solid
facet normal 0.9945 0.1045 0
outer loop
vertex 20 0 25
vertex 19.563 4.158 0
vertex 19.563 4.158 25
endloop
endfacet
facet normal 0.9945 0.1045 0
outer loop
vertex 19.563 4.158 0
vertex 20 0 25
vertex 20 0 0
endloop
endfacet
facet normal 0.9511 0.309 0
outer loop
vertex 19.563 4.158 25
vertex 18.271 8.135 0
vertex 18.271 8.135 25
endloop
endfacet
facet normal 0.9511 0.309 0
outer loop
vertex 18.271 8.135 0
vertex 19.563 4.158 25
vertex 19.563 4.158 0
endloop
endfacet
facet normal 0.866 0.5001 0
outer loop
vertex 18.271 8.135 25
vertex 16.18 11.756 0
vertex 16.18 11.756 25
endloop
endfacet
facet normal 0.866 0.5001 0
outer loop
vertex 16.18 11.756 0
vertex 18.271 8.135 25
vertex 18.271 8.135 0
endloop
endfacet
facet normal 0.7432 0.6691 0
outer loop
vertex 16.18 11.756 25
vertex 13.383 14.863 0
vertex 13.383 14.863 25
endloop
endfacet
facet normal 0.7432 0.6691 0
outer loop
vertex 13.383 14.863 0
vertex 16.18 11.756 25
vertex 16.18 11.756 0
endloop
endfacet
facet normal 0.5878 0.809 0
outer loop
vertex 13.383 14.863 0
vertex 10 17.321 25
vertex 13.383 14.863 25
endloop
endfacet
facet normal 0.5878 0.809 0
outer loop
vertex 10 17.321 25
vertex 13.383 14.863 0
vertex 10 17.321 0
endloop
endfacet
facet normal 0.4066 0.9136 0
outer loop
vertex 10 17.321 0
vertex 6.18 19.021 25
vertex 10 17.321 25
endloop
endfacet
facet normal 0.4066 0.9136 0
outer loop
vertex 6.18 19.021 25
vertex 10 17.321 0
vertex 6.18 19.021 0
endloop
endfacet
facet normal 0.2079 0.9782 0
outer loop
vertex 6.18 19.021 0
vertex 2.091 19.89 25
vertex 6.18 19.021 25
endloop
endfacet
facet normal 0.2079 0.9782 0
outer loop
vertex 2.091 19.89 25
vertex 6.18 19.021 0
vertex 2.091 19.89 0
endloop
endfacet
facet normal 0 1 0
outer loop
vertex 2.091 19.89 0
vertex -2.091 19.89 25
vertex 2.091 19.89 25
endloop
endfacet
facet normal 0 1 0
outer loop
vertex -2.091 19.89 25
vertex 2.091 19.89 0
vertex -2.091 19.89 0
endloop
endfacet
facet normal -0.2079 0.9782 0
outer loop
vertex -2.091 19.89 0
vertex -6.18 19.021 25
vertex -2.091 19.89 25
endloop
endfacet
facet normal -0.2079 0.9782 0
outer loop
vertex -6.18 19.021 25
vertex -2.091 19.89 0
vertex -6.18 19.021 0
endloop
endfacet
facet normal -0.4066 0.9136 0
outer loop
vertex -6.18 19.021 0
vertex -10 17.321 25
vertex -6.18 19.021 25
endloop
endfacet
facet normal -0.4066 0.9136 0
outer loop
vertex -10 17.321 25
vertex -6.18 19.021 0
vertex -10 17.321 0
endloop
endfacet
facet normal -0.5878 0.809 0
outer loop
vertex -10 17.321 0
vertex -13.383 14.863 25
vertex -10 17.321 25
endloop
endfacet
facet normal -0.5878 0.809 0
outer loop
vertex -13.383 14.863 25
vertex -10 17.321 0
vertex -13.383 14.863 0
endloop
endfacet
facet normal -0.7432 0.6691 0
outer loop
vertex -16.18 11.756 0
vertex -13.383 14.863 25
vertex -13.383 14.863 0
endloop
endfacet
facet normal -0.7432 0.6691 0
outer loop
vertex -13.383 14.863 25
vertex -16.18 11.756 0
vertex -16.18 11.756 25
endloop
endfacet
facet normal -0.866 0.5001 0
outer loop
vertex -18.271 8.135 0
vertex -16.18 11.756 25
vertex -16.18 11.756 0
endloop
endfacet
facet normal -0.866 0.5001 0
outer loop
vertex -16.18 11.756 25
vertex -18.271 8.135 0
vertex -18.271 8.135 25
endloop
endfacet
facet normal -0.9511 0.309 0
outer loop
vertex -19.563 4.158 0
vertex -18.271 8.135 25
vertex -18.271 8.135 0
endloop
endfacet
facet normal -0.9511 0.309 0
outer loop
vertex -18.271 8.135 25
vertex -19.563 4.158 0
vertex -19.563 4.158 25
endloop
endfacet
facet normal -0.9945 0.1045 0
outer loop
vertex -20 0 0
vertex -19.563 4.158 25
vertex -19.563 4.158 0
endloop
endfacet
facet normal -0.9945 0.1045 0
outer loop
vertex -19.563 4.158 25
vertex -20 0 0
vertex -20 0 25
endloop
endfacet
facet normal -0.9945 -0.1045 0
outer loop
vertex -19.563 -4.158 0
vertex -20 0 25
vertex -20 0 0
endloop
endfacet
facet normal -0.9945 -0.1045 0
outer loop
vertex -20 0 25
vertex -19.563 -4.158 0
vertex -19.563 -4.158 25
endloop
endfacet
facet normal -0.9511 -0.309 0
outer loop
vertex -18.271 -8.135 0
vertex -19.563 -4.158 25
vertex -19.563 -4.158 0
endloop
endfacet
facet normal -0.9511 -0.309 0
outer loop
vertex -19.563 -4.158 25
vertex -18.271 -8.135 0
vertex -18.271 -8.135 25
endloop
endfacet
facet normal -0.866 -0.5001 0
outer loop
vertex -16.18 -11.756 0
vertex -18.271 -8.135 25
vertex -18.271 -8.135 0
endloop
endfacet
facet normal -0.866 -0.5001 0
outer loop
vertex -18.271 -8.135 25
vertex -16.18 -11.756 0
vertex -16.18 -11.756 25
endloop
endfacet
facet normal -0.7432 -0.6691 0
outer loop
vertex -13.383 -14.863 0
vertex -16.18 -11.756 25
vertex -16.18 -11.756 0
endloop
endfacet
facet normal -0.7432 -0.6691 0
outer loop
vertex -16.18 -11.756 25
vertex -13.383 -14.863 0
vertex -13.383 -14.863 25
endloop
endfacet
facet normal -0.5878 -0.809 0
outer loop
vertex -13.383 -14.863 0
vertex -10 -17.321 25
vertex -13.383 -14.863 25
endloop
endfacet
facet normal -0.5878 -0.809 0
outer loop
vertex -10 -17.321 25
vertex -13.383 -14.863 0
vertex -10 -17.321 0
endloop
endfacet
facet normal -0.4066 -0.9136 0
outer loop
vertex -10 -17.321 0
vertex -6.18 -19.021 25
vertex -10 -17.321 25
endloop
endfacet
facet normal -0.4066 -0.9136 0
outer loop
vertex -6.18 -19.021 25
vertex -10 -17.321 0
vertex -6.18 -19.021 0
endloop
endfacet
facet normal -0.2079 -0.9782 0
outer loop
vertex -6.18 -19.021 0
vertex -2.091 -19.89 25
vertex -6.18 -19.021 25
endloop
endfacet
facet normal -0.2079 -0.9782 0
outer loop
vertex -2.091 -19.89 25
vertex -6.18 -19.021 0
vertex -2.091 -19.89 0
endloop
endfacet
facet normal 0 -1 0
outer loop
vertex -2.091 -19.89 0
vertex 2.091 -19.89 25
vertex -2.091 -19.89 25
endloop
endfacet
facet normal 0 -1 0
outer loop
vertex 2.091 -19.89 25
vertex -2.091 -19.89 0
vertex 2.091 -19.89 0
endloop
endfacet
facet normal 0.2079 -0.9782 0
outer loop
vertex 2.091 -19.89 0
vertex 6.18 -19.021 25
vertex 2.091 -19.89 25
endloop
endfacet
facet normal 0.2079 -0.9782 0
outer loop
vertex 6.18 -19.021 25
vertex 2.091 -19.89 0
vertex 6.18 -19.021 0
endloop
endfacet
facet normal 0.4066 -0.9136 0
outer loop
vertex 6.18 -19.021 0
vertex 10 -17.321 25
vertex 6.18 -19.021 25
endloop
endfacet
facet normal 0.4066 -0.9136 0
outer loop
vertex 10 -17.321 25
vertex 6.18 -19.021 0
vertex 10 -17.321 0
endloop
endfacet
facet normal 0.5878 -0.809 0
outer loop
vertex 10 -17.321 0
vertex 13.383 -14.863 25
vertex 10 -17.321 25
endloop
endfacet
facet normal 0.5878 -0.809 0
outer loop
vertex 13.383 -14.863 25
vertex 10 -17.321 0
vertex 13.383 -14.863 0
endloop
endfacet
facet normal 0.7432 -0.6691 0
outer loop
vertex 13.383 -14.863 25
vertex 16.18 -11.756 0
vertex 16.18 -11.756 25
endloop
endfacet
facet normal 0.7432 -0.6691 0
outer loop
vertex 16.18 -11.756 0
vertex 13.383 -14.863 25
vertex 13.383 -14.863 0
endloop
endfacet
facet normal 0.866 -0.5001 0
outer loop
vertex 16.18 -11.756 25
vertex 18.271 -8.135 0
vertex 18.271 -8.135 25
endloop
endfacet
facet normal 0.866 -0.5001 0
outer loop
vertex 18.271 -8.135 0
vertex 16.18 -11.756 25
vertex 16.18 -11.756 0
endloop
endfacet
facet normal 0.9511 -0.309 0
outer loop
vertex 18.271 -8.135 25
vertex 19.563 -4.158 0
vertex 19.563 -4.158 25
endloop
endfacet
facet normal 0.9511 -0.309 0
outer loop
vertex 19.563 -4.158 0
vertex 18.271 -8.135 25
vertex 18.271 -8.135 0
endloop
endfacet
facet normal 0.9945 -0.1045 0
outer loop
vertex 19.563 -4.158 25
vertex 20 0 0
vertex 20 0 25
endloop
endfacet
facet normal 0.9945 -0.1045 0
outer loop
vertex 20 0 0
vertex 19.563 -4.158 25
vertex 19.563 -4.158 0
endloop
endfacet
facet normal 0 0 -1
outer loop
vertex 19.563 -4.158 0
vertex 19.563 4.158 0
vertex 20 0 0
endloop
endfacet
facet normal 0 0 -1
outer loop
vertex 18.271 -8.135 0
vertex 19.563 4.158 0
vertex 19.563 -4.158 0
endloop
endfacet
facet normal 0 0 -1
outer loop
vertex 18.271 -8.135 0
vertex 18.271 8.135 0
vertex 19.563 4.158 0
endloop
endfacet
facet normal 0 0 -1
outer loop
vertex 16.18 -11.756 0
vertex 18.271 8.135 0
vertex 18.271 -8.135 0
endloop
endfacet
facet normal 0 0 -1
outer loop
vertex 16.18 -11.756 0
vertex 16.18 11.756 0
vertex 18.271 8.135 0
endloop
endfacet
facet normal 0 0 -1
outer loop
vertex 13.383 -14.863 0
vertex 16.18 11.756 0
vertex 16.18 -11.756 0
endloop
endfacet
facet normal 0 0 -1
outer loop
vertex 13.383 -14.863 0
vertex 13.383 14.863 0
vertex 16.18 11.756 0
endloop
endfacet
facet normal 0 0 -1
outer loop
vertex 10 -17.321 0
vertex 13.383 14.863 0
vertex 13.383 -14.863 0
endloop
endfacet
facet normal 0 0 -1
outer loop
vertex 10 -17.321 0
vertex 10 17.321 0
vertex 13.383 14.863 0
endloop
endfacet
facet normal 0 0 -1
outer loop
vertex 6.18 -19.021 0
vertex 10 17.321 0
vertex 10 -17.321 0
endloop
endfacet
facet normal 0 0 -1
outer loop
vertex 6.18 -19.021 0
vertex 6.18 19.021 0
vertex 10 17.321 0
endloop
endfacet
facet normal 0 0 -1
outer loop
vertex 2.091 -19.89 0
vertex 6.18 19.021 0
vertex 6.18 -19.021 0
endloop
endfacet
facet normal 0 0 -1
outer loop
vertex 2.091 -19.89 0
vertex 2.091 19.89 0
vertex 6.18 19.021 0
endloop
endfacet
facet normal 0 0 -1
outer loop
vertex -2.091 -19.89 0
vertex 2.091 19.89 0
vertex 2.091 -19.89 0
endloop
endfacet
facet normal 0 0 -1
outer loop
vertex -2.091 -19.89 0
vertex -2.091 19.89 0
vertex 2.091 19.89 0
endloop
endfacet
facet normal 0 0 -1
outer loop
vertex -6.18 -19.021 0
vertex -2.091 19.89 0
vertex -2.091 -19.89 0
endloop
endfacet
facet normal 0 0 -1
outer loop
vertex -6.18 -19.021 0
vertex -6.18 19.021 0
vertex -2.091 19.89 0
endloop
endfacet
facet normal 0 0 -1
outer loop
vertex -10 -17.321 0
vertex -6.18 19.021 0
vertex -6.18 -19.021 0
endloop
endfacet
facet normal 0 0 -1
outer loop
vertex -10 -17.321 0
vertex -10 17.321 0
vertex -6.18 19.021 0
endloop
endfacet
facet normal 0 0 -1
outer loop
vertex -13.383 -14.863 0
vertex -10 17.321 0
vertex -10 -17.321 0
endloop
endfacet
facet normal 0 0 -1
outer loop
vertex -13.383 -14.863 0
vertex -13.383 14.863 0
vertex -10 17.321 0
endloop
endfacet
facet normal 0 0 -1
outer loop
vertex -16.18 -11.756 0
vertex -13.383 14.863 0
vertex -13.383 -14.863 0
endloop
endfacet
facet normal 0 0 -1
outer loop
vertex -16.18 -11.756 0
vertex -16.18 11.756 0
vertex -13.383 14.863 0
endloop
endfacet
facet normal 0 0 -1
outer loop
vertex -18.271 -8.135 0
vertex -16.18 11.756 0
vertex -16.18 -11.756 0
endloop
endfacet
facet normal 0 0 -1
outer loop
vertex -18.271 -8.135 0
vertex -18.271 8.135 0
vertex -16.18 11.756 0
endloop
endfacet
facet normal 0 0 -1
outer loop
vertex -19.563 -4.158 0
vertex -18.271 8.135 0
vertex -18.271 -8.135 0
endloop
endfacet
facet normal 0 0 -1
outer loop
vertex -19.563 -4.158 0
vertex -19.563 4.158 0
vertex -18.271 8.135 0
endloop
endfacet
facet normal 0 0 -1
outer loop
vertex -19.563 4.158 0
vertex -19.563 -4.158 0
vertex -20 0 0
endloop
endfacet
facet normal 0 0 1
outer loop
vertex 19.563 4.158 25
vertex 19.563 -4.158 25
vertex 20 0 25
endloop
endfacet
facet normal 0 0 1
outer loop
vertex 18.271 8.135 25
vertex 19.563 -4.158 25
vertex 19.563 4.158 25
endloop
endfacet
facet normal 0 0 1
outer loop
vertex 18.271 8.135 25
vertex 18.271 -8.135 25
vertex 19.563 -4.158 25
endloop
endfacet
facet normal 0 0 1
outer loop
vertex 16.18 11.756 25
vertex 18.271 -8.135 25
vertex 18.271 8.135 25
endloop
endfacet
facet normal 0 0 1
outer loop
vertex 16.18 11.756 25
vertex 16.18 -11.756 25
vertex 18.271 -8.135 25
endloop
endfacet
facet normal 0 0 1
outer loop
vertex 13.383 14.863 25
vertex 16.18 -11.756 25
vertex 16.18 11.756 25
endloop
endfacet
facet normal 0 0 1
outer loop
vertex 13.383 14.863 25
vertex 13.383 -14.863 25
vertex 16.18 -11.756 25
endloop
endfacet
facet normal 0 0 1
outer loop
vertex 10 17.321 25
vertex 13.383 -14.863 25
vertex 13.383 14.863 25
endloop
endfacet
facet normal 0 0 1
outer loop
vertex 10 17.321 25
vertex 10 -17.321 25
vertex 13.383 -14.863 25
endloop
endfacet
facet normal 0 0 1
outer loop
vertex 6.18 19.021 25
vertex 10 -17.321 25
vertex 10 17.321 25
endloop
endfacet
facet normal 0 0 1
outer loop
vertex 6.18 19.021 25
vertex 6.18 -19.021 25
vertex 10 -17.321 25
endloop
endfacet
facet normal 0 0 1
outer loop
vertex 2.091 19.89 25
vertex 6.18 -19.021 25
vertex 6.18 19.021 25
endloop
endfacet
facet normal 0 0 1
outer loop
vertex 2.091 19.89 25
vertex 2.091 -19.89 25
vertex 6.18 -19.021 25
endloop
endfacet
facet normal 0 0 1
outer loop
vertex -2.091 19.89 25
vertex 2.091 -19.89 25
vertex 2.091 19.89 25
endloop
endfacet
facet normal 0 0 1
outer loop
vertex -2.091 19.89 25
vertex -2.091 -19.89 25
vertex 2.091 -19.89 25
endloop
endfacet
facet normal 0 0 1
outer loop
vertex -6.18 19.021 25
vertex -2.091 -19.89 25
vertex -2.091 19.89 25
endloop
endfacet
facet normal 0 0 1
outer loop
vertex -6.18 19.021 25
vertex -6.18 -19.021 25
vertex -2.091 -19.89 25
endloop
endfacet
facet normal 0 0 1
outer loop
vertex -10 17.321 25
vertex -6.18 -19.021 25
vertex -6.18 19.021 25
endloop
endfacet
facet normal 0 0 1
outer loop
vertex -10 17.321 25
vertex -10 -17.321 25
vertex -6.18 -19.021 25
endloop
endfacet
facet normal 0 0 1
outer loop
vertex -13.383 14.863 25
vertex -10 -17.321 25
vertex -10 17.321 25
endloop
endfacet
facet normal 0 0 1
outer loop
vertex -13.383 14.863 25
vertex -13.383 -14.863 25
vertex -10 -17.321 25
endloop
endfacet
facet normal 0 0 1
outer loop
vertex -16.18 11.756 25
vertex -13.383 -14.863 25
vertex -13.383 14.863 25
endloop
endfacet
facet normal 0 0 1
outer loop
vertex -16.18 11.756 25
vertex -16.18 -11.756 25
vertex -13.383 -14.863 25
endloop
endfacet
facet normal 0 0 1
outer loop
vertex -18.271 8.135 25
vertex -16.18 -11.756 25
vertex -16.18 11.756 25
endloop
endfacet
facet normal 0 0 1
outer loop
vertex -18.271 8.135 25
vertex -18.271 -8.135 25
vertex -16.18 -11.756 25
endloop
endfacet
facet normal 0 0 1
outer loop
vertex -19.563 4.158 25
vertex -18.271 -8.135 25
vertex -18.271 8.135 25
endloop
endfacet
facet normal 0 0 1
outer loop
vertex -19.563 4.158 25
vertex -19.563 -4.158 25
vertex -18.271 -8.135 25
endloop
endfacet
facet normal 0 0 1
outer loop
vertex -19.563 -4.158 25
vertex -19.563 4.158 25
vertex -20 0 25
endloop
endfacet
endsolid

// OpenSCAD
//Telescope lense adapter

telescopeDiameter = 36;
telescopeRadius = telescopeDiameter / 2;
telescopeLenseLength = 25;
camDiameter = 35;
camRadius = camDiameter / 2;
camLenseLength = 14;

wallThickness = 2;

//
adapter();


module adapter(){
cylinder(telescopeLenseLength, telescopeRadius + wallThickness, telescopeRadius + wallThickness);
}
